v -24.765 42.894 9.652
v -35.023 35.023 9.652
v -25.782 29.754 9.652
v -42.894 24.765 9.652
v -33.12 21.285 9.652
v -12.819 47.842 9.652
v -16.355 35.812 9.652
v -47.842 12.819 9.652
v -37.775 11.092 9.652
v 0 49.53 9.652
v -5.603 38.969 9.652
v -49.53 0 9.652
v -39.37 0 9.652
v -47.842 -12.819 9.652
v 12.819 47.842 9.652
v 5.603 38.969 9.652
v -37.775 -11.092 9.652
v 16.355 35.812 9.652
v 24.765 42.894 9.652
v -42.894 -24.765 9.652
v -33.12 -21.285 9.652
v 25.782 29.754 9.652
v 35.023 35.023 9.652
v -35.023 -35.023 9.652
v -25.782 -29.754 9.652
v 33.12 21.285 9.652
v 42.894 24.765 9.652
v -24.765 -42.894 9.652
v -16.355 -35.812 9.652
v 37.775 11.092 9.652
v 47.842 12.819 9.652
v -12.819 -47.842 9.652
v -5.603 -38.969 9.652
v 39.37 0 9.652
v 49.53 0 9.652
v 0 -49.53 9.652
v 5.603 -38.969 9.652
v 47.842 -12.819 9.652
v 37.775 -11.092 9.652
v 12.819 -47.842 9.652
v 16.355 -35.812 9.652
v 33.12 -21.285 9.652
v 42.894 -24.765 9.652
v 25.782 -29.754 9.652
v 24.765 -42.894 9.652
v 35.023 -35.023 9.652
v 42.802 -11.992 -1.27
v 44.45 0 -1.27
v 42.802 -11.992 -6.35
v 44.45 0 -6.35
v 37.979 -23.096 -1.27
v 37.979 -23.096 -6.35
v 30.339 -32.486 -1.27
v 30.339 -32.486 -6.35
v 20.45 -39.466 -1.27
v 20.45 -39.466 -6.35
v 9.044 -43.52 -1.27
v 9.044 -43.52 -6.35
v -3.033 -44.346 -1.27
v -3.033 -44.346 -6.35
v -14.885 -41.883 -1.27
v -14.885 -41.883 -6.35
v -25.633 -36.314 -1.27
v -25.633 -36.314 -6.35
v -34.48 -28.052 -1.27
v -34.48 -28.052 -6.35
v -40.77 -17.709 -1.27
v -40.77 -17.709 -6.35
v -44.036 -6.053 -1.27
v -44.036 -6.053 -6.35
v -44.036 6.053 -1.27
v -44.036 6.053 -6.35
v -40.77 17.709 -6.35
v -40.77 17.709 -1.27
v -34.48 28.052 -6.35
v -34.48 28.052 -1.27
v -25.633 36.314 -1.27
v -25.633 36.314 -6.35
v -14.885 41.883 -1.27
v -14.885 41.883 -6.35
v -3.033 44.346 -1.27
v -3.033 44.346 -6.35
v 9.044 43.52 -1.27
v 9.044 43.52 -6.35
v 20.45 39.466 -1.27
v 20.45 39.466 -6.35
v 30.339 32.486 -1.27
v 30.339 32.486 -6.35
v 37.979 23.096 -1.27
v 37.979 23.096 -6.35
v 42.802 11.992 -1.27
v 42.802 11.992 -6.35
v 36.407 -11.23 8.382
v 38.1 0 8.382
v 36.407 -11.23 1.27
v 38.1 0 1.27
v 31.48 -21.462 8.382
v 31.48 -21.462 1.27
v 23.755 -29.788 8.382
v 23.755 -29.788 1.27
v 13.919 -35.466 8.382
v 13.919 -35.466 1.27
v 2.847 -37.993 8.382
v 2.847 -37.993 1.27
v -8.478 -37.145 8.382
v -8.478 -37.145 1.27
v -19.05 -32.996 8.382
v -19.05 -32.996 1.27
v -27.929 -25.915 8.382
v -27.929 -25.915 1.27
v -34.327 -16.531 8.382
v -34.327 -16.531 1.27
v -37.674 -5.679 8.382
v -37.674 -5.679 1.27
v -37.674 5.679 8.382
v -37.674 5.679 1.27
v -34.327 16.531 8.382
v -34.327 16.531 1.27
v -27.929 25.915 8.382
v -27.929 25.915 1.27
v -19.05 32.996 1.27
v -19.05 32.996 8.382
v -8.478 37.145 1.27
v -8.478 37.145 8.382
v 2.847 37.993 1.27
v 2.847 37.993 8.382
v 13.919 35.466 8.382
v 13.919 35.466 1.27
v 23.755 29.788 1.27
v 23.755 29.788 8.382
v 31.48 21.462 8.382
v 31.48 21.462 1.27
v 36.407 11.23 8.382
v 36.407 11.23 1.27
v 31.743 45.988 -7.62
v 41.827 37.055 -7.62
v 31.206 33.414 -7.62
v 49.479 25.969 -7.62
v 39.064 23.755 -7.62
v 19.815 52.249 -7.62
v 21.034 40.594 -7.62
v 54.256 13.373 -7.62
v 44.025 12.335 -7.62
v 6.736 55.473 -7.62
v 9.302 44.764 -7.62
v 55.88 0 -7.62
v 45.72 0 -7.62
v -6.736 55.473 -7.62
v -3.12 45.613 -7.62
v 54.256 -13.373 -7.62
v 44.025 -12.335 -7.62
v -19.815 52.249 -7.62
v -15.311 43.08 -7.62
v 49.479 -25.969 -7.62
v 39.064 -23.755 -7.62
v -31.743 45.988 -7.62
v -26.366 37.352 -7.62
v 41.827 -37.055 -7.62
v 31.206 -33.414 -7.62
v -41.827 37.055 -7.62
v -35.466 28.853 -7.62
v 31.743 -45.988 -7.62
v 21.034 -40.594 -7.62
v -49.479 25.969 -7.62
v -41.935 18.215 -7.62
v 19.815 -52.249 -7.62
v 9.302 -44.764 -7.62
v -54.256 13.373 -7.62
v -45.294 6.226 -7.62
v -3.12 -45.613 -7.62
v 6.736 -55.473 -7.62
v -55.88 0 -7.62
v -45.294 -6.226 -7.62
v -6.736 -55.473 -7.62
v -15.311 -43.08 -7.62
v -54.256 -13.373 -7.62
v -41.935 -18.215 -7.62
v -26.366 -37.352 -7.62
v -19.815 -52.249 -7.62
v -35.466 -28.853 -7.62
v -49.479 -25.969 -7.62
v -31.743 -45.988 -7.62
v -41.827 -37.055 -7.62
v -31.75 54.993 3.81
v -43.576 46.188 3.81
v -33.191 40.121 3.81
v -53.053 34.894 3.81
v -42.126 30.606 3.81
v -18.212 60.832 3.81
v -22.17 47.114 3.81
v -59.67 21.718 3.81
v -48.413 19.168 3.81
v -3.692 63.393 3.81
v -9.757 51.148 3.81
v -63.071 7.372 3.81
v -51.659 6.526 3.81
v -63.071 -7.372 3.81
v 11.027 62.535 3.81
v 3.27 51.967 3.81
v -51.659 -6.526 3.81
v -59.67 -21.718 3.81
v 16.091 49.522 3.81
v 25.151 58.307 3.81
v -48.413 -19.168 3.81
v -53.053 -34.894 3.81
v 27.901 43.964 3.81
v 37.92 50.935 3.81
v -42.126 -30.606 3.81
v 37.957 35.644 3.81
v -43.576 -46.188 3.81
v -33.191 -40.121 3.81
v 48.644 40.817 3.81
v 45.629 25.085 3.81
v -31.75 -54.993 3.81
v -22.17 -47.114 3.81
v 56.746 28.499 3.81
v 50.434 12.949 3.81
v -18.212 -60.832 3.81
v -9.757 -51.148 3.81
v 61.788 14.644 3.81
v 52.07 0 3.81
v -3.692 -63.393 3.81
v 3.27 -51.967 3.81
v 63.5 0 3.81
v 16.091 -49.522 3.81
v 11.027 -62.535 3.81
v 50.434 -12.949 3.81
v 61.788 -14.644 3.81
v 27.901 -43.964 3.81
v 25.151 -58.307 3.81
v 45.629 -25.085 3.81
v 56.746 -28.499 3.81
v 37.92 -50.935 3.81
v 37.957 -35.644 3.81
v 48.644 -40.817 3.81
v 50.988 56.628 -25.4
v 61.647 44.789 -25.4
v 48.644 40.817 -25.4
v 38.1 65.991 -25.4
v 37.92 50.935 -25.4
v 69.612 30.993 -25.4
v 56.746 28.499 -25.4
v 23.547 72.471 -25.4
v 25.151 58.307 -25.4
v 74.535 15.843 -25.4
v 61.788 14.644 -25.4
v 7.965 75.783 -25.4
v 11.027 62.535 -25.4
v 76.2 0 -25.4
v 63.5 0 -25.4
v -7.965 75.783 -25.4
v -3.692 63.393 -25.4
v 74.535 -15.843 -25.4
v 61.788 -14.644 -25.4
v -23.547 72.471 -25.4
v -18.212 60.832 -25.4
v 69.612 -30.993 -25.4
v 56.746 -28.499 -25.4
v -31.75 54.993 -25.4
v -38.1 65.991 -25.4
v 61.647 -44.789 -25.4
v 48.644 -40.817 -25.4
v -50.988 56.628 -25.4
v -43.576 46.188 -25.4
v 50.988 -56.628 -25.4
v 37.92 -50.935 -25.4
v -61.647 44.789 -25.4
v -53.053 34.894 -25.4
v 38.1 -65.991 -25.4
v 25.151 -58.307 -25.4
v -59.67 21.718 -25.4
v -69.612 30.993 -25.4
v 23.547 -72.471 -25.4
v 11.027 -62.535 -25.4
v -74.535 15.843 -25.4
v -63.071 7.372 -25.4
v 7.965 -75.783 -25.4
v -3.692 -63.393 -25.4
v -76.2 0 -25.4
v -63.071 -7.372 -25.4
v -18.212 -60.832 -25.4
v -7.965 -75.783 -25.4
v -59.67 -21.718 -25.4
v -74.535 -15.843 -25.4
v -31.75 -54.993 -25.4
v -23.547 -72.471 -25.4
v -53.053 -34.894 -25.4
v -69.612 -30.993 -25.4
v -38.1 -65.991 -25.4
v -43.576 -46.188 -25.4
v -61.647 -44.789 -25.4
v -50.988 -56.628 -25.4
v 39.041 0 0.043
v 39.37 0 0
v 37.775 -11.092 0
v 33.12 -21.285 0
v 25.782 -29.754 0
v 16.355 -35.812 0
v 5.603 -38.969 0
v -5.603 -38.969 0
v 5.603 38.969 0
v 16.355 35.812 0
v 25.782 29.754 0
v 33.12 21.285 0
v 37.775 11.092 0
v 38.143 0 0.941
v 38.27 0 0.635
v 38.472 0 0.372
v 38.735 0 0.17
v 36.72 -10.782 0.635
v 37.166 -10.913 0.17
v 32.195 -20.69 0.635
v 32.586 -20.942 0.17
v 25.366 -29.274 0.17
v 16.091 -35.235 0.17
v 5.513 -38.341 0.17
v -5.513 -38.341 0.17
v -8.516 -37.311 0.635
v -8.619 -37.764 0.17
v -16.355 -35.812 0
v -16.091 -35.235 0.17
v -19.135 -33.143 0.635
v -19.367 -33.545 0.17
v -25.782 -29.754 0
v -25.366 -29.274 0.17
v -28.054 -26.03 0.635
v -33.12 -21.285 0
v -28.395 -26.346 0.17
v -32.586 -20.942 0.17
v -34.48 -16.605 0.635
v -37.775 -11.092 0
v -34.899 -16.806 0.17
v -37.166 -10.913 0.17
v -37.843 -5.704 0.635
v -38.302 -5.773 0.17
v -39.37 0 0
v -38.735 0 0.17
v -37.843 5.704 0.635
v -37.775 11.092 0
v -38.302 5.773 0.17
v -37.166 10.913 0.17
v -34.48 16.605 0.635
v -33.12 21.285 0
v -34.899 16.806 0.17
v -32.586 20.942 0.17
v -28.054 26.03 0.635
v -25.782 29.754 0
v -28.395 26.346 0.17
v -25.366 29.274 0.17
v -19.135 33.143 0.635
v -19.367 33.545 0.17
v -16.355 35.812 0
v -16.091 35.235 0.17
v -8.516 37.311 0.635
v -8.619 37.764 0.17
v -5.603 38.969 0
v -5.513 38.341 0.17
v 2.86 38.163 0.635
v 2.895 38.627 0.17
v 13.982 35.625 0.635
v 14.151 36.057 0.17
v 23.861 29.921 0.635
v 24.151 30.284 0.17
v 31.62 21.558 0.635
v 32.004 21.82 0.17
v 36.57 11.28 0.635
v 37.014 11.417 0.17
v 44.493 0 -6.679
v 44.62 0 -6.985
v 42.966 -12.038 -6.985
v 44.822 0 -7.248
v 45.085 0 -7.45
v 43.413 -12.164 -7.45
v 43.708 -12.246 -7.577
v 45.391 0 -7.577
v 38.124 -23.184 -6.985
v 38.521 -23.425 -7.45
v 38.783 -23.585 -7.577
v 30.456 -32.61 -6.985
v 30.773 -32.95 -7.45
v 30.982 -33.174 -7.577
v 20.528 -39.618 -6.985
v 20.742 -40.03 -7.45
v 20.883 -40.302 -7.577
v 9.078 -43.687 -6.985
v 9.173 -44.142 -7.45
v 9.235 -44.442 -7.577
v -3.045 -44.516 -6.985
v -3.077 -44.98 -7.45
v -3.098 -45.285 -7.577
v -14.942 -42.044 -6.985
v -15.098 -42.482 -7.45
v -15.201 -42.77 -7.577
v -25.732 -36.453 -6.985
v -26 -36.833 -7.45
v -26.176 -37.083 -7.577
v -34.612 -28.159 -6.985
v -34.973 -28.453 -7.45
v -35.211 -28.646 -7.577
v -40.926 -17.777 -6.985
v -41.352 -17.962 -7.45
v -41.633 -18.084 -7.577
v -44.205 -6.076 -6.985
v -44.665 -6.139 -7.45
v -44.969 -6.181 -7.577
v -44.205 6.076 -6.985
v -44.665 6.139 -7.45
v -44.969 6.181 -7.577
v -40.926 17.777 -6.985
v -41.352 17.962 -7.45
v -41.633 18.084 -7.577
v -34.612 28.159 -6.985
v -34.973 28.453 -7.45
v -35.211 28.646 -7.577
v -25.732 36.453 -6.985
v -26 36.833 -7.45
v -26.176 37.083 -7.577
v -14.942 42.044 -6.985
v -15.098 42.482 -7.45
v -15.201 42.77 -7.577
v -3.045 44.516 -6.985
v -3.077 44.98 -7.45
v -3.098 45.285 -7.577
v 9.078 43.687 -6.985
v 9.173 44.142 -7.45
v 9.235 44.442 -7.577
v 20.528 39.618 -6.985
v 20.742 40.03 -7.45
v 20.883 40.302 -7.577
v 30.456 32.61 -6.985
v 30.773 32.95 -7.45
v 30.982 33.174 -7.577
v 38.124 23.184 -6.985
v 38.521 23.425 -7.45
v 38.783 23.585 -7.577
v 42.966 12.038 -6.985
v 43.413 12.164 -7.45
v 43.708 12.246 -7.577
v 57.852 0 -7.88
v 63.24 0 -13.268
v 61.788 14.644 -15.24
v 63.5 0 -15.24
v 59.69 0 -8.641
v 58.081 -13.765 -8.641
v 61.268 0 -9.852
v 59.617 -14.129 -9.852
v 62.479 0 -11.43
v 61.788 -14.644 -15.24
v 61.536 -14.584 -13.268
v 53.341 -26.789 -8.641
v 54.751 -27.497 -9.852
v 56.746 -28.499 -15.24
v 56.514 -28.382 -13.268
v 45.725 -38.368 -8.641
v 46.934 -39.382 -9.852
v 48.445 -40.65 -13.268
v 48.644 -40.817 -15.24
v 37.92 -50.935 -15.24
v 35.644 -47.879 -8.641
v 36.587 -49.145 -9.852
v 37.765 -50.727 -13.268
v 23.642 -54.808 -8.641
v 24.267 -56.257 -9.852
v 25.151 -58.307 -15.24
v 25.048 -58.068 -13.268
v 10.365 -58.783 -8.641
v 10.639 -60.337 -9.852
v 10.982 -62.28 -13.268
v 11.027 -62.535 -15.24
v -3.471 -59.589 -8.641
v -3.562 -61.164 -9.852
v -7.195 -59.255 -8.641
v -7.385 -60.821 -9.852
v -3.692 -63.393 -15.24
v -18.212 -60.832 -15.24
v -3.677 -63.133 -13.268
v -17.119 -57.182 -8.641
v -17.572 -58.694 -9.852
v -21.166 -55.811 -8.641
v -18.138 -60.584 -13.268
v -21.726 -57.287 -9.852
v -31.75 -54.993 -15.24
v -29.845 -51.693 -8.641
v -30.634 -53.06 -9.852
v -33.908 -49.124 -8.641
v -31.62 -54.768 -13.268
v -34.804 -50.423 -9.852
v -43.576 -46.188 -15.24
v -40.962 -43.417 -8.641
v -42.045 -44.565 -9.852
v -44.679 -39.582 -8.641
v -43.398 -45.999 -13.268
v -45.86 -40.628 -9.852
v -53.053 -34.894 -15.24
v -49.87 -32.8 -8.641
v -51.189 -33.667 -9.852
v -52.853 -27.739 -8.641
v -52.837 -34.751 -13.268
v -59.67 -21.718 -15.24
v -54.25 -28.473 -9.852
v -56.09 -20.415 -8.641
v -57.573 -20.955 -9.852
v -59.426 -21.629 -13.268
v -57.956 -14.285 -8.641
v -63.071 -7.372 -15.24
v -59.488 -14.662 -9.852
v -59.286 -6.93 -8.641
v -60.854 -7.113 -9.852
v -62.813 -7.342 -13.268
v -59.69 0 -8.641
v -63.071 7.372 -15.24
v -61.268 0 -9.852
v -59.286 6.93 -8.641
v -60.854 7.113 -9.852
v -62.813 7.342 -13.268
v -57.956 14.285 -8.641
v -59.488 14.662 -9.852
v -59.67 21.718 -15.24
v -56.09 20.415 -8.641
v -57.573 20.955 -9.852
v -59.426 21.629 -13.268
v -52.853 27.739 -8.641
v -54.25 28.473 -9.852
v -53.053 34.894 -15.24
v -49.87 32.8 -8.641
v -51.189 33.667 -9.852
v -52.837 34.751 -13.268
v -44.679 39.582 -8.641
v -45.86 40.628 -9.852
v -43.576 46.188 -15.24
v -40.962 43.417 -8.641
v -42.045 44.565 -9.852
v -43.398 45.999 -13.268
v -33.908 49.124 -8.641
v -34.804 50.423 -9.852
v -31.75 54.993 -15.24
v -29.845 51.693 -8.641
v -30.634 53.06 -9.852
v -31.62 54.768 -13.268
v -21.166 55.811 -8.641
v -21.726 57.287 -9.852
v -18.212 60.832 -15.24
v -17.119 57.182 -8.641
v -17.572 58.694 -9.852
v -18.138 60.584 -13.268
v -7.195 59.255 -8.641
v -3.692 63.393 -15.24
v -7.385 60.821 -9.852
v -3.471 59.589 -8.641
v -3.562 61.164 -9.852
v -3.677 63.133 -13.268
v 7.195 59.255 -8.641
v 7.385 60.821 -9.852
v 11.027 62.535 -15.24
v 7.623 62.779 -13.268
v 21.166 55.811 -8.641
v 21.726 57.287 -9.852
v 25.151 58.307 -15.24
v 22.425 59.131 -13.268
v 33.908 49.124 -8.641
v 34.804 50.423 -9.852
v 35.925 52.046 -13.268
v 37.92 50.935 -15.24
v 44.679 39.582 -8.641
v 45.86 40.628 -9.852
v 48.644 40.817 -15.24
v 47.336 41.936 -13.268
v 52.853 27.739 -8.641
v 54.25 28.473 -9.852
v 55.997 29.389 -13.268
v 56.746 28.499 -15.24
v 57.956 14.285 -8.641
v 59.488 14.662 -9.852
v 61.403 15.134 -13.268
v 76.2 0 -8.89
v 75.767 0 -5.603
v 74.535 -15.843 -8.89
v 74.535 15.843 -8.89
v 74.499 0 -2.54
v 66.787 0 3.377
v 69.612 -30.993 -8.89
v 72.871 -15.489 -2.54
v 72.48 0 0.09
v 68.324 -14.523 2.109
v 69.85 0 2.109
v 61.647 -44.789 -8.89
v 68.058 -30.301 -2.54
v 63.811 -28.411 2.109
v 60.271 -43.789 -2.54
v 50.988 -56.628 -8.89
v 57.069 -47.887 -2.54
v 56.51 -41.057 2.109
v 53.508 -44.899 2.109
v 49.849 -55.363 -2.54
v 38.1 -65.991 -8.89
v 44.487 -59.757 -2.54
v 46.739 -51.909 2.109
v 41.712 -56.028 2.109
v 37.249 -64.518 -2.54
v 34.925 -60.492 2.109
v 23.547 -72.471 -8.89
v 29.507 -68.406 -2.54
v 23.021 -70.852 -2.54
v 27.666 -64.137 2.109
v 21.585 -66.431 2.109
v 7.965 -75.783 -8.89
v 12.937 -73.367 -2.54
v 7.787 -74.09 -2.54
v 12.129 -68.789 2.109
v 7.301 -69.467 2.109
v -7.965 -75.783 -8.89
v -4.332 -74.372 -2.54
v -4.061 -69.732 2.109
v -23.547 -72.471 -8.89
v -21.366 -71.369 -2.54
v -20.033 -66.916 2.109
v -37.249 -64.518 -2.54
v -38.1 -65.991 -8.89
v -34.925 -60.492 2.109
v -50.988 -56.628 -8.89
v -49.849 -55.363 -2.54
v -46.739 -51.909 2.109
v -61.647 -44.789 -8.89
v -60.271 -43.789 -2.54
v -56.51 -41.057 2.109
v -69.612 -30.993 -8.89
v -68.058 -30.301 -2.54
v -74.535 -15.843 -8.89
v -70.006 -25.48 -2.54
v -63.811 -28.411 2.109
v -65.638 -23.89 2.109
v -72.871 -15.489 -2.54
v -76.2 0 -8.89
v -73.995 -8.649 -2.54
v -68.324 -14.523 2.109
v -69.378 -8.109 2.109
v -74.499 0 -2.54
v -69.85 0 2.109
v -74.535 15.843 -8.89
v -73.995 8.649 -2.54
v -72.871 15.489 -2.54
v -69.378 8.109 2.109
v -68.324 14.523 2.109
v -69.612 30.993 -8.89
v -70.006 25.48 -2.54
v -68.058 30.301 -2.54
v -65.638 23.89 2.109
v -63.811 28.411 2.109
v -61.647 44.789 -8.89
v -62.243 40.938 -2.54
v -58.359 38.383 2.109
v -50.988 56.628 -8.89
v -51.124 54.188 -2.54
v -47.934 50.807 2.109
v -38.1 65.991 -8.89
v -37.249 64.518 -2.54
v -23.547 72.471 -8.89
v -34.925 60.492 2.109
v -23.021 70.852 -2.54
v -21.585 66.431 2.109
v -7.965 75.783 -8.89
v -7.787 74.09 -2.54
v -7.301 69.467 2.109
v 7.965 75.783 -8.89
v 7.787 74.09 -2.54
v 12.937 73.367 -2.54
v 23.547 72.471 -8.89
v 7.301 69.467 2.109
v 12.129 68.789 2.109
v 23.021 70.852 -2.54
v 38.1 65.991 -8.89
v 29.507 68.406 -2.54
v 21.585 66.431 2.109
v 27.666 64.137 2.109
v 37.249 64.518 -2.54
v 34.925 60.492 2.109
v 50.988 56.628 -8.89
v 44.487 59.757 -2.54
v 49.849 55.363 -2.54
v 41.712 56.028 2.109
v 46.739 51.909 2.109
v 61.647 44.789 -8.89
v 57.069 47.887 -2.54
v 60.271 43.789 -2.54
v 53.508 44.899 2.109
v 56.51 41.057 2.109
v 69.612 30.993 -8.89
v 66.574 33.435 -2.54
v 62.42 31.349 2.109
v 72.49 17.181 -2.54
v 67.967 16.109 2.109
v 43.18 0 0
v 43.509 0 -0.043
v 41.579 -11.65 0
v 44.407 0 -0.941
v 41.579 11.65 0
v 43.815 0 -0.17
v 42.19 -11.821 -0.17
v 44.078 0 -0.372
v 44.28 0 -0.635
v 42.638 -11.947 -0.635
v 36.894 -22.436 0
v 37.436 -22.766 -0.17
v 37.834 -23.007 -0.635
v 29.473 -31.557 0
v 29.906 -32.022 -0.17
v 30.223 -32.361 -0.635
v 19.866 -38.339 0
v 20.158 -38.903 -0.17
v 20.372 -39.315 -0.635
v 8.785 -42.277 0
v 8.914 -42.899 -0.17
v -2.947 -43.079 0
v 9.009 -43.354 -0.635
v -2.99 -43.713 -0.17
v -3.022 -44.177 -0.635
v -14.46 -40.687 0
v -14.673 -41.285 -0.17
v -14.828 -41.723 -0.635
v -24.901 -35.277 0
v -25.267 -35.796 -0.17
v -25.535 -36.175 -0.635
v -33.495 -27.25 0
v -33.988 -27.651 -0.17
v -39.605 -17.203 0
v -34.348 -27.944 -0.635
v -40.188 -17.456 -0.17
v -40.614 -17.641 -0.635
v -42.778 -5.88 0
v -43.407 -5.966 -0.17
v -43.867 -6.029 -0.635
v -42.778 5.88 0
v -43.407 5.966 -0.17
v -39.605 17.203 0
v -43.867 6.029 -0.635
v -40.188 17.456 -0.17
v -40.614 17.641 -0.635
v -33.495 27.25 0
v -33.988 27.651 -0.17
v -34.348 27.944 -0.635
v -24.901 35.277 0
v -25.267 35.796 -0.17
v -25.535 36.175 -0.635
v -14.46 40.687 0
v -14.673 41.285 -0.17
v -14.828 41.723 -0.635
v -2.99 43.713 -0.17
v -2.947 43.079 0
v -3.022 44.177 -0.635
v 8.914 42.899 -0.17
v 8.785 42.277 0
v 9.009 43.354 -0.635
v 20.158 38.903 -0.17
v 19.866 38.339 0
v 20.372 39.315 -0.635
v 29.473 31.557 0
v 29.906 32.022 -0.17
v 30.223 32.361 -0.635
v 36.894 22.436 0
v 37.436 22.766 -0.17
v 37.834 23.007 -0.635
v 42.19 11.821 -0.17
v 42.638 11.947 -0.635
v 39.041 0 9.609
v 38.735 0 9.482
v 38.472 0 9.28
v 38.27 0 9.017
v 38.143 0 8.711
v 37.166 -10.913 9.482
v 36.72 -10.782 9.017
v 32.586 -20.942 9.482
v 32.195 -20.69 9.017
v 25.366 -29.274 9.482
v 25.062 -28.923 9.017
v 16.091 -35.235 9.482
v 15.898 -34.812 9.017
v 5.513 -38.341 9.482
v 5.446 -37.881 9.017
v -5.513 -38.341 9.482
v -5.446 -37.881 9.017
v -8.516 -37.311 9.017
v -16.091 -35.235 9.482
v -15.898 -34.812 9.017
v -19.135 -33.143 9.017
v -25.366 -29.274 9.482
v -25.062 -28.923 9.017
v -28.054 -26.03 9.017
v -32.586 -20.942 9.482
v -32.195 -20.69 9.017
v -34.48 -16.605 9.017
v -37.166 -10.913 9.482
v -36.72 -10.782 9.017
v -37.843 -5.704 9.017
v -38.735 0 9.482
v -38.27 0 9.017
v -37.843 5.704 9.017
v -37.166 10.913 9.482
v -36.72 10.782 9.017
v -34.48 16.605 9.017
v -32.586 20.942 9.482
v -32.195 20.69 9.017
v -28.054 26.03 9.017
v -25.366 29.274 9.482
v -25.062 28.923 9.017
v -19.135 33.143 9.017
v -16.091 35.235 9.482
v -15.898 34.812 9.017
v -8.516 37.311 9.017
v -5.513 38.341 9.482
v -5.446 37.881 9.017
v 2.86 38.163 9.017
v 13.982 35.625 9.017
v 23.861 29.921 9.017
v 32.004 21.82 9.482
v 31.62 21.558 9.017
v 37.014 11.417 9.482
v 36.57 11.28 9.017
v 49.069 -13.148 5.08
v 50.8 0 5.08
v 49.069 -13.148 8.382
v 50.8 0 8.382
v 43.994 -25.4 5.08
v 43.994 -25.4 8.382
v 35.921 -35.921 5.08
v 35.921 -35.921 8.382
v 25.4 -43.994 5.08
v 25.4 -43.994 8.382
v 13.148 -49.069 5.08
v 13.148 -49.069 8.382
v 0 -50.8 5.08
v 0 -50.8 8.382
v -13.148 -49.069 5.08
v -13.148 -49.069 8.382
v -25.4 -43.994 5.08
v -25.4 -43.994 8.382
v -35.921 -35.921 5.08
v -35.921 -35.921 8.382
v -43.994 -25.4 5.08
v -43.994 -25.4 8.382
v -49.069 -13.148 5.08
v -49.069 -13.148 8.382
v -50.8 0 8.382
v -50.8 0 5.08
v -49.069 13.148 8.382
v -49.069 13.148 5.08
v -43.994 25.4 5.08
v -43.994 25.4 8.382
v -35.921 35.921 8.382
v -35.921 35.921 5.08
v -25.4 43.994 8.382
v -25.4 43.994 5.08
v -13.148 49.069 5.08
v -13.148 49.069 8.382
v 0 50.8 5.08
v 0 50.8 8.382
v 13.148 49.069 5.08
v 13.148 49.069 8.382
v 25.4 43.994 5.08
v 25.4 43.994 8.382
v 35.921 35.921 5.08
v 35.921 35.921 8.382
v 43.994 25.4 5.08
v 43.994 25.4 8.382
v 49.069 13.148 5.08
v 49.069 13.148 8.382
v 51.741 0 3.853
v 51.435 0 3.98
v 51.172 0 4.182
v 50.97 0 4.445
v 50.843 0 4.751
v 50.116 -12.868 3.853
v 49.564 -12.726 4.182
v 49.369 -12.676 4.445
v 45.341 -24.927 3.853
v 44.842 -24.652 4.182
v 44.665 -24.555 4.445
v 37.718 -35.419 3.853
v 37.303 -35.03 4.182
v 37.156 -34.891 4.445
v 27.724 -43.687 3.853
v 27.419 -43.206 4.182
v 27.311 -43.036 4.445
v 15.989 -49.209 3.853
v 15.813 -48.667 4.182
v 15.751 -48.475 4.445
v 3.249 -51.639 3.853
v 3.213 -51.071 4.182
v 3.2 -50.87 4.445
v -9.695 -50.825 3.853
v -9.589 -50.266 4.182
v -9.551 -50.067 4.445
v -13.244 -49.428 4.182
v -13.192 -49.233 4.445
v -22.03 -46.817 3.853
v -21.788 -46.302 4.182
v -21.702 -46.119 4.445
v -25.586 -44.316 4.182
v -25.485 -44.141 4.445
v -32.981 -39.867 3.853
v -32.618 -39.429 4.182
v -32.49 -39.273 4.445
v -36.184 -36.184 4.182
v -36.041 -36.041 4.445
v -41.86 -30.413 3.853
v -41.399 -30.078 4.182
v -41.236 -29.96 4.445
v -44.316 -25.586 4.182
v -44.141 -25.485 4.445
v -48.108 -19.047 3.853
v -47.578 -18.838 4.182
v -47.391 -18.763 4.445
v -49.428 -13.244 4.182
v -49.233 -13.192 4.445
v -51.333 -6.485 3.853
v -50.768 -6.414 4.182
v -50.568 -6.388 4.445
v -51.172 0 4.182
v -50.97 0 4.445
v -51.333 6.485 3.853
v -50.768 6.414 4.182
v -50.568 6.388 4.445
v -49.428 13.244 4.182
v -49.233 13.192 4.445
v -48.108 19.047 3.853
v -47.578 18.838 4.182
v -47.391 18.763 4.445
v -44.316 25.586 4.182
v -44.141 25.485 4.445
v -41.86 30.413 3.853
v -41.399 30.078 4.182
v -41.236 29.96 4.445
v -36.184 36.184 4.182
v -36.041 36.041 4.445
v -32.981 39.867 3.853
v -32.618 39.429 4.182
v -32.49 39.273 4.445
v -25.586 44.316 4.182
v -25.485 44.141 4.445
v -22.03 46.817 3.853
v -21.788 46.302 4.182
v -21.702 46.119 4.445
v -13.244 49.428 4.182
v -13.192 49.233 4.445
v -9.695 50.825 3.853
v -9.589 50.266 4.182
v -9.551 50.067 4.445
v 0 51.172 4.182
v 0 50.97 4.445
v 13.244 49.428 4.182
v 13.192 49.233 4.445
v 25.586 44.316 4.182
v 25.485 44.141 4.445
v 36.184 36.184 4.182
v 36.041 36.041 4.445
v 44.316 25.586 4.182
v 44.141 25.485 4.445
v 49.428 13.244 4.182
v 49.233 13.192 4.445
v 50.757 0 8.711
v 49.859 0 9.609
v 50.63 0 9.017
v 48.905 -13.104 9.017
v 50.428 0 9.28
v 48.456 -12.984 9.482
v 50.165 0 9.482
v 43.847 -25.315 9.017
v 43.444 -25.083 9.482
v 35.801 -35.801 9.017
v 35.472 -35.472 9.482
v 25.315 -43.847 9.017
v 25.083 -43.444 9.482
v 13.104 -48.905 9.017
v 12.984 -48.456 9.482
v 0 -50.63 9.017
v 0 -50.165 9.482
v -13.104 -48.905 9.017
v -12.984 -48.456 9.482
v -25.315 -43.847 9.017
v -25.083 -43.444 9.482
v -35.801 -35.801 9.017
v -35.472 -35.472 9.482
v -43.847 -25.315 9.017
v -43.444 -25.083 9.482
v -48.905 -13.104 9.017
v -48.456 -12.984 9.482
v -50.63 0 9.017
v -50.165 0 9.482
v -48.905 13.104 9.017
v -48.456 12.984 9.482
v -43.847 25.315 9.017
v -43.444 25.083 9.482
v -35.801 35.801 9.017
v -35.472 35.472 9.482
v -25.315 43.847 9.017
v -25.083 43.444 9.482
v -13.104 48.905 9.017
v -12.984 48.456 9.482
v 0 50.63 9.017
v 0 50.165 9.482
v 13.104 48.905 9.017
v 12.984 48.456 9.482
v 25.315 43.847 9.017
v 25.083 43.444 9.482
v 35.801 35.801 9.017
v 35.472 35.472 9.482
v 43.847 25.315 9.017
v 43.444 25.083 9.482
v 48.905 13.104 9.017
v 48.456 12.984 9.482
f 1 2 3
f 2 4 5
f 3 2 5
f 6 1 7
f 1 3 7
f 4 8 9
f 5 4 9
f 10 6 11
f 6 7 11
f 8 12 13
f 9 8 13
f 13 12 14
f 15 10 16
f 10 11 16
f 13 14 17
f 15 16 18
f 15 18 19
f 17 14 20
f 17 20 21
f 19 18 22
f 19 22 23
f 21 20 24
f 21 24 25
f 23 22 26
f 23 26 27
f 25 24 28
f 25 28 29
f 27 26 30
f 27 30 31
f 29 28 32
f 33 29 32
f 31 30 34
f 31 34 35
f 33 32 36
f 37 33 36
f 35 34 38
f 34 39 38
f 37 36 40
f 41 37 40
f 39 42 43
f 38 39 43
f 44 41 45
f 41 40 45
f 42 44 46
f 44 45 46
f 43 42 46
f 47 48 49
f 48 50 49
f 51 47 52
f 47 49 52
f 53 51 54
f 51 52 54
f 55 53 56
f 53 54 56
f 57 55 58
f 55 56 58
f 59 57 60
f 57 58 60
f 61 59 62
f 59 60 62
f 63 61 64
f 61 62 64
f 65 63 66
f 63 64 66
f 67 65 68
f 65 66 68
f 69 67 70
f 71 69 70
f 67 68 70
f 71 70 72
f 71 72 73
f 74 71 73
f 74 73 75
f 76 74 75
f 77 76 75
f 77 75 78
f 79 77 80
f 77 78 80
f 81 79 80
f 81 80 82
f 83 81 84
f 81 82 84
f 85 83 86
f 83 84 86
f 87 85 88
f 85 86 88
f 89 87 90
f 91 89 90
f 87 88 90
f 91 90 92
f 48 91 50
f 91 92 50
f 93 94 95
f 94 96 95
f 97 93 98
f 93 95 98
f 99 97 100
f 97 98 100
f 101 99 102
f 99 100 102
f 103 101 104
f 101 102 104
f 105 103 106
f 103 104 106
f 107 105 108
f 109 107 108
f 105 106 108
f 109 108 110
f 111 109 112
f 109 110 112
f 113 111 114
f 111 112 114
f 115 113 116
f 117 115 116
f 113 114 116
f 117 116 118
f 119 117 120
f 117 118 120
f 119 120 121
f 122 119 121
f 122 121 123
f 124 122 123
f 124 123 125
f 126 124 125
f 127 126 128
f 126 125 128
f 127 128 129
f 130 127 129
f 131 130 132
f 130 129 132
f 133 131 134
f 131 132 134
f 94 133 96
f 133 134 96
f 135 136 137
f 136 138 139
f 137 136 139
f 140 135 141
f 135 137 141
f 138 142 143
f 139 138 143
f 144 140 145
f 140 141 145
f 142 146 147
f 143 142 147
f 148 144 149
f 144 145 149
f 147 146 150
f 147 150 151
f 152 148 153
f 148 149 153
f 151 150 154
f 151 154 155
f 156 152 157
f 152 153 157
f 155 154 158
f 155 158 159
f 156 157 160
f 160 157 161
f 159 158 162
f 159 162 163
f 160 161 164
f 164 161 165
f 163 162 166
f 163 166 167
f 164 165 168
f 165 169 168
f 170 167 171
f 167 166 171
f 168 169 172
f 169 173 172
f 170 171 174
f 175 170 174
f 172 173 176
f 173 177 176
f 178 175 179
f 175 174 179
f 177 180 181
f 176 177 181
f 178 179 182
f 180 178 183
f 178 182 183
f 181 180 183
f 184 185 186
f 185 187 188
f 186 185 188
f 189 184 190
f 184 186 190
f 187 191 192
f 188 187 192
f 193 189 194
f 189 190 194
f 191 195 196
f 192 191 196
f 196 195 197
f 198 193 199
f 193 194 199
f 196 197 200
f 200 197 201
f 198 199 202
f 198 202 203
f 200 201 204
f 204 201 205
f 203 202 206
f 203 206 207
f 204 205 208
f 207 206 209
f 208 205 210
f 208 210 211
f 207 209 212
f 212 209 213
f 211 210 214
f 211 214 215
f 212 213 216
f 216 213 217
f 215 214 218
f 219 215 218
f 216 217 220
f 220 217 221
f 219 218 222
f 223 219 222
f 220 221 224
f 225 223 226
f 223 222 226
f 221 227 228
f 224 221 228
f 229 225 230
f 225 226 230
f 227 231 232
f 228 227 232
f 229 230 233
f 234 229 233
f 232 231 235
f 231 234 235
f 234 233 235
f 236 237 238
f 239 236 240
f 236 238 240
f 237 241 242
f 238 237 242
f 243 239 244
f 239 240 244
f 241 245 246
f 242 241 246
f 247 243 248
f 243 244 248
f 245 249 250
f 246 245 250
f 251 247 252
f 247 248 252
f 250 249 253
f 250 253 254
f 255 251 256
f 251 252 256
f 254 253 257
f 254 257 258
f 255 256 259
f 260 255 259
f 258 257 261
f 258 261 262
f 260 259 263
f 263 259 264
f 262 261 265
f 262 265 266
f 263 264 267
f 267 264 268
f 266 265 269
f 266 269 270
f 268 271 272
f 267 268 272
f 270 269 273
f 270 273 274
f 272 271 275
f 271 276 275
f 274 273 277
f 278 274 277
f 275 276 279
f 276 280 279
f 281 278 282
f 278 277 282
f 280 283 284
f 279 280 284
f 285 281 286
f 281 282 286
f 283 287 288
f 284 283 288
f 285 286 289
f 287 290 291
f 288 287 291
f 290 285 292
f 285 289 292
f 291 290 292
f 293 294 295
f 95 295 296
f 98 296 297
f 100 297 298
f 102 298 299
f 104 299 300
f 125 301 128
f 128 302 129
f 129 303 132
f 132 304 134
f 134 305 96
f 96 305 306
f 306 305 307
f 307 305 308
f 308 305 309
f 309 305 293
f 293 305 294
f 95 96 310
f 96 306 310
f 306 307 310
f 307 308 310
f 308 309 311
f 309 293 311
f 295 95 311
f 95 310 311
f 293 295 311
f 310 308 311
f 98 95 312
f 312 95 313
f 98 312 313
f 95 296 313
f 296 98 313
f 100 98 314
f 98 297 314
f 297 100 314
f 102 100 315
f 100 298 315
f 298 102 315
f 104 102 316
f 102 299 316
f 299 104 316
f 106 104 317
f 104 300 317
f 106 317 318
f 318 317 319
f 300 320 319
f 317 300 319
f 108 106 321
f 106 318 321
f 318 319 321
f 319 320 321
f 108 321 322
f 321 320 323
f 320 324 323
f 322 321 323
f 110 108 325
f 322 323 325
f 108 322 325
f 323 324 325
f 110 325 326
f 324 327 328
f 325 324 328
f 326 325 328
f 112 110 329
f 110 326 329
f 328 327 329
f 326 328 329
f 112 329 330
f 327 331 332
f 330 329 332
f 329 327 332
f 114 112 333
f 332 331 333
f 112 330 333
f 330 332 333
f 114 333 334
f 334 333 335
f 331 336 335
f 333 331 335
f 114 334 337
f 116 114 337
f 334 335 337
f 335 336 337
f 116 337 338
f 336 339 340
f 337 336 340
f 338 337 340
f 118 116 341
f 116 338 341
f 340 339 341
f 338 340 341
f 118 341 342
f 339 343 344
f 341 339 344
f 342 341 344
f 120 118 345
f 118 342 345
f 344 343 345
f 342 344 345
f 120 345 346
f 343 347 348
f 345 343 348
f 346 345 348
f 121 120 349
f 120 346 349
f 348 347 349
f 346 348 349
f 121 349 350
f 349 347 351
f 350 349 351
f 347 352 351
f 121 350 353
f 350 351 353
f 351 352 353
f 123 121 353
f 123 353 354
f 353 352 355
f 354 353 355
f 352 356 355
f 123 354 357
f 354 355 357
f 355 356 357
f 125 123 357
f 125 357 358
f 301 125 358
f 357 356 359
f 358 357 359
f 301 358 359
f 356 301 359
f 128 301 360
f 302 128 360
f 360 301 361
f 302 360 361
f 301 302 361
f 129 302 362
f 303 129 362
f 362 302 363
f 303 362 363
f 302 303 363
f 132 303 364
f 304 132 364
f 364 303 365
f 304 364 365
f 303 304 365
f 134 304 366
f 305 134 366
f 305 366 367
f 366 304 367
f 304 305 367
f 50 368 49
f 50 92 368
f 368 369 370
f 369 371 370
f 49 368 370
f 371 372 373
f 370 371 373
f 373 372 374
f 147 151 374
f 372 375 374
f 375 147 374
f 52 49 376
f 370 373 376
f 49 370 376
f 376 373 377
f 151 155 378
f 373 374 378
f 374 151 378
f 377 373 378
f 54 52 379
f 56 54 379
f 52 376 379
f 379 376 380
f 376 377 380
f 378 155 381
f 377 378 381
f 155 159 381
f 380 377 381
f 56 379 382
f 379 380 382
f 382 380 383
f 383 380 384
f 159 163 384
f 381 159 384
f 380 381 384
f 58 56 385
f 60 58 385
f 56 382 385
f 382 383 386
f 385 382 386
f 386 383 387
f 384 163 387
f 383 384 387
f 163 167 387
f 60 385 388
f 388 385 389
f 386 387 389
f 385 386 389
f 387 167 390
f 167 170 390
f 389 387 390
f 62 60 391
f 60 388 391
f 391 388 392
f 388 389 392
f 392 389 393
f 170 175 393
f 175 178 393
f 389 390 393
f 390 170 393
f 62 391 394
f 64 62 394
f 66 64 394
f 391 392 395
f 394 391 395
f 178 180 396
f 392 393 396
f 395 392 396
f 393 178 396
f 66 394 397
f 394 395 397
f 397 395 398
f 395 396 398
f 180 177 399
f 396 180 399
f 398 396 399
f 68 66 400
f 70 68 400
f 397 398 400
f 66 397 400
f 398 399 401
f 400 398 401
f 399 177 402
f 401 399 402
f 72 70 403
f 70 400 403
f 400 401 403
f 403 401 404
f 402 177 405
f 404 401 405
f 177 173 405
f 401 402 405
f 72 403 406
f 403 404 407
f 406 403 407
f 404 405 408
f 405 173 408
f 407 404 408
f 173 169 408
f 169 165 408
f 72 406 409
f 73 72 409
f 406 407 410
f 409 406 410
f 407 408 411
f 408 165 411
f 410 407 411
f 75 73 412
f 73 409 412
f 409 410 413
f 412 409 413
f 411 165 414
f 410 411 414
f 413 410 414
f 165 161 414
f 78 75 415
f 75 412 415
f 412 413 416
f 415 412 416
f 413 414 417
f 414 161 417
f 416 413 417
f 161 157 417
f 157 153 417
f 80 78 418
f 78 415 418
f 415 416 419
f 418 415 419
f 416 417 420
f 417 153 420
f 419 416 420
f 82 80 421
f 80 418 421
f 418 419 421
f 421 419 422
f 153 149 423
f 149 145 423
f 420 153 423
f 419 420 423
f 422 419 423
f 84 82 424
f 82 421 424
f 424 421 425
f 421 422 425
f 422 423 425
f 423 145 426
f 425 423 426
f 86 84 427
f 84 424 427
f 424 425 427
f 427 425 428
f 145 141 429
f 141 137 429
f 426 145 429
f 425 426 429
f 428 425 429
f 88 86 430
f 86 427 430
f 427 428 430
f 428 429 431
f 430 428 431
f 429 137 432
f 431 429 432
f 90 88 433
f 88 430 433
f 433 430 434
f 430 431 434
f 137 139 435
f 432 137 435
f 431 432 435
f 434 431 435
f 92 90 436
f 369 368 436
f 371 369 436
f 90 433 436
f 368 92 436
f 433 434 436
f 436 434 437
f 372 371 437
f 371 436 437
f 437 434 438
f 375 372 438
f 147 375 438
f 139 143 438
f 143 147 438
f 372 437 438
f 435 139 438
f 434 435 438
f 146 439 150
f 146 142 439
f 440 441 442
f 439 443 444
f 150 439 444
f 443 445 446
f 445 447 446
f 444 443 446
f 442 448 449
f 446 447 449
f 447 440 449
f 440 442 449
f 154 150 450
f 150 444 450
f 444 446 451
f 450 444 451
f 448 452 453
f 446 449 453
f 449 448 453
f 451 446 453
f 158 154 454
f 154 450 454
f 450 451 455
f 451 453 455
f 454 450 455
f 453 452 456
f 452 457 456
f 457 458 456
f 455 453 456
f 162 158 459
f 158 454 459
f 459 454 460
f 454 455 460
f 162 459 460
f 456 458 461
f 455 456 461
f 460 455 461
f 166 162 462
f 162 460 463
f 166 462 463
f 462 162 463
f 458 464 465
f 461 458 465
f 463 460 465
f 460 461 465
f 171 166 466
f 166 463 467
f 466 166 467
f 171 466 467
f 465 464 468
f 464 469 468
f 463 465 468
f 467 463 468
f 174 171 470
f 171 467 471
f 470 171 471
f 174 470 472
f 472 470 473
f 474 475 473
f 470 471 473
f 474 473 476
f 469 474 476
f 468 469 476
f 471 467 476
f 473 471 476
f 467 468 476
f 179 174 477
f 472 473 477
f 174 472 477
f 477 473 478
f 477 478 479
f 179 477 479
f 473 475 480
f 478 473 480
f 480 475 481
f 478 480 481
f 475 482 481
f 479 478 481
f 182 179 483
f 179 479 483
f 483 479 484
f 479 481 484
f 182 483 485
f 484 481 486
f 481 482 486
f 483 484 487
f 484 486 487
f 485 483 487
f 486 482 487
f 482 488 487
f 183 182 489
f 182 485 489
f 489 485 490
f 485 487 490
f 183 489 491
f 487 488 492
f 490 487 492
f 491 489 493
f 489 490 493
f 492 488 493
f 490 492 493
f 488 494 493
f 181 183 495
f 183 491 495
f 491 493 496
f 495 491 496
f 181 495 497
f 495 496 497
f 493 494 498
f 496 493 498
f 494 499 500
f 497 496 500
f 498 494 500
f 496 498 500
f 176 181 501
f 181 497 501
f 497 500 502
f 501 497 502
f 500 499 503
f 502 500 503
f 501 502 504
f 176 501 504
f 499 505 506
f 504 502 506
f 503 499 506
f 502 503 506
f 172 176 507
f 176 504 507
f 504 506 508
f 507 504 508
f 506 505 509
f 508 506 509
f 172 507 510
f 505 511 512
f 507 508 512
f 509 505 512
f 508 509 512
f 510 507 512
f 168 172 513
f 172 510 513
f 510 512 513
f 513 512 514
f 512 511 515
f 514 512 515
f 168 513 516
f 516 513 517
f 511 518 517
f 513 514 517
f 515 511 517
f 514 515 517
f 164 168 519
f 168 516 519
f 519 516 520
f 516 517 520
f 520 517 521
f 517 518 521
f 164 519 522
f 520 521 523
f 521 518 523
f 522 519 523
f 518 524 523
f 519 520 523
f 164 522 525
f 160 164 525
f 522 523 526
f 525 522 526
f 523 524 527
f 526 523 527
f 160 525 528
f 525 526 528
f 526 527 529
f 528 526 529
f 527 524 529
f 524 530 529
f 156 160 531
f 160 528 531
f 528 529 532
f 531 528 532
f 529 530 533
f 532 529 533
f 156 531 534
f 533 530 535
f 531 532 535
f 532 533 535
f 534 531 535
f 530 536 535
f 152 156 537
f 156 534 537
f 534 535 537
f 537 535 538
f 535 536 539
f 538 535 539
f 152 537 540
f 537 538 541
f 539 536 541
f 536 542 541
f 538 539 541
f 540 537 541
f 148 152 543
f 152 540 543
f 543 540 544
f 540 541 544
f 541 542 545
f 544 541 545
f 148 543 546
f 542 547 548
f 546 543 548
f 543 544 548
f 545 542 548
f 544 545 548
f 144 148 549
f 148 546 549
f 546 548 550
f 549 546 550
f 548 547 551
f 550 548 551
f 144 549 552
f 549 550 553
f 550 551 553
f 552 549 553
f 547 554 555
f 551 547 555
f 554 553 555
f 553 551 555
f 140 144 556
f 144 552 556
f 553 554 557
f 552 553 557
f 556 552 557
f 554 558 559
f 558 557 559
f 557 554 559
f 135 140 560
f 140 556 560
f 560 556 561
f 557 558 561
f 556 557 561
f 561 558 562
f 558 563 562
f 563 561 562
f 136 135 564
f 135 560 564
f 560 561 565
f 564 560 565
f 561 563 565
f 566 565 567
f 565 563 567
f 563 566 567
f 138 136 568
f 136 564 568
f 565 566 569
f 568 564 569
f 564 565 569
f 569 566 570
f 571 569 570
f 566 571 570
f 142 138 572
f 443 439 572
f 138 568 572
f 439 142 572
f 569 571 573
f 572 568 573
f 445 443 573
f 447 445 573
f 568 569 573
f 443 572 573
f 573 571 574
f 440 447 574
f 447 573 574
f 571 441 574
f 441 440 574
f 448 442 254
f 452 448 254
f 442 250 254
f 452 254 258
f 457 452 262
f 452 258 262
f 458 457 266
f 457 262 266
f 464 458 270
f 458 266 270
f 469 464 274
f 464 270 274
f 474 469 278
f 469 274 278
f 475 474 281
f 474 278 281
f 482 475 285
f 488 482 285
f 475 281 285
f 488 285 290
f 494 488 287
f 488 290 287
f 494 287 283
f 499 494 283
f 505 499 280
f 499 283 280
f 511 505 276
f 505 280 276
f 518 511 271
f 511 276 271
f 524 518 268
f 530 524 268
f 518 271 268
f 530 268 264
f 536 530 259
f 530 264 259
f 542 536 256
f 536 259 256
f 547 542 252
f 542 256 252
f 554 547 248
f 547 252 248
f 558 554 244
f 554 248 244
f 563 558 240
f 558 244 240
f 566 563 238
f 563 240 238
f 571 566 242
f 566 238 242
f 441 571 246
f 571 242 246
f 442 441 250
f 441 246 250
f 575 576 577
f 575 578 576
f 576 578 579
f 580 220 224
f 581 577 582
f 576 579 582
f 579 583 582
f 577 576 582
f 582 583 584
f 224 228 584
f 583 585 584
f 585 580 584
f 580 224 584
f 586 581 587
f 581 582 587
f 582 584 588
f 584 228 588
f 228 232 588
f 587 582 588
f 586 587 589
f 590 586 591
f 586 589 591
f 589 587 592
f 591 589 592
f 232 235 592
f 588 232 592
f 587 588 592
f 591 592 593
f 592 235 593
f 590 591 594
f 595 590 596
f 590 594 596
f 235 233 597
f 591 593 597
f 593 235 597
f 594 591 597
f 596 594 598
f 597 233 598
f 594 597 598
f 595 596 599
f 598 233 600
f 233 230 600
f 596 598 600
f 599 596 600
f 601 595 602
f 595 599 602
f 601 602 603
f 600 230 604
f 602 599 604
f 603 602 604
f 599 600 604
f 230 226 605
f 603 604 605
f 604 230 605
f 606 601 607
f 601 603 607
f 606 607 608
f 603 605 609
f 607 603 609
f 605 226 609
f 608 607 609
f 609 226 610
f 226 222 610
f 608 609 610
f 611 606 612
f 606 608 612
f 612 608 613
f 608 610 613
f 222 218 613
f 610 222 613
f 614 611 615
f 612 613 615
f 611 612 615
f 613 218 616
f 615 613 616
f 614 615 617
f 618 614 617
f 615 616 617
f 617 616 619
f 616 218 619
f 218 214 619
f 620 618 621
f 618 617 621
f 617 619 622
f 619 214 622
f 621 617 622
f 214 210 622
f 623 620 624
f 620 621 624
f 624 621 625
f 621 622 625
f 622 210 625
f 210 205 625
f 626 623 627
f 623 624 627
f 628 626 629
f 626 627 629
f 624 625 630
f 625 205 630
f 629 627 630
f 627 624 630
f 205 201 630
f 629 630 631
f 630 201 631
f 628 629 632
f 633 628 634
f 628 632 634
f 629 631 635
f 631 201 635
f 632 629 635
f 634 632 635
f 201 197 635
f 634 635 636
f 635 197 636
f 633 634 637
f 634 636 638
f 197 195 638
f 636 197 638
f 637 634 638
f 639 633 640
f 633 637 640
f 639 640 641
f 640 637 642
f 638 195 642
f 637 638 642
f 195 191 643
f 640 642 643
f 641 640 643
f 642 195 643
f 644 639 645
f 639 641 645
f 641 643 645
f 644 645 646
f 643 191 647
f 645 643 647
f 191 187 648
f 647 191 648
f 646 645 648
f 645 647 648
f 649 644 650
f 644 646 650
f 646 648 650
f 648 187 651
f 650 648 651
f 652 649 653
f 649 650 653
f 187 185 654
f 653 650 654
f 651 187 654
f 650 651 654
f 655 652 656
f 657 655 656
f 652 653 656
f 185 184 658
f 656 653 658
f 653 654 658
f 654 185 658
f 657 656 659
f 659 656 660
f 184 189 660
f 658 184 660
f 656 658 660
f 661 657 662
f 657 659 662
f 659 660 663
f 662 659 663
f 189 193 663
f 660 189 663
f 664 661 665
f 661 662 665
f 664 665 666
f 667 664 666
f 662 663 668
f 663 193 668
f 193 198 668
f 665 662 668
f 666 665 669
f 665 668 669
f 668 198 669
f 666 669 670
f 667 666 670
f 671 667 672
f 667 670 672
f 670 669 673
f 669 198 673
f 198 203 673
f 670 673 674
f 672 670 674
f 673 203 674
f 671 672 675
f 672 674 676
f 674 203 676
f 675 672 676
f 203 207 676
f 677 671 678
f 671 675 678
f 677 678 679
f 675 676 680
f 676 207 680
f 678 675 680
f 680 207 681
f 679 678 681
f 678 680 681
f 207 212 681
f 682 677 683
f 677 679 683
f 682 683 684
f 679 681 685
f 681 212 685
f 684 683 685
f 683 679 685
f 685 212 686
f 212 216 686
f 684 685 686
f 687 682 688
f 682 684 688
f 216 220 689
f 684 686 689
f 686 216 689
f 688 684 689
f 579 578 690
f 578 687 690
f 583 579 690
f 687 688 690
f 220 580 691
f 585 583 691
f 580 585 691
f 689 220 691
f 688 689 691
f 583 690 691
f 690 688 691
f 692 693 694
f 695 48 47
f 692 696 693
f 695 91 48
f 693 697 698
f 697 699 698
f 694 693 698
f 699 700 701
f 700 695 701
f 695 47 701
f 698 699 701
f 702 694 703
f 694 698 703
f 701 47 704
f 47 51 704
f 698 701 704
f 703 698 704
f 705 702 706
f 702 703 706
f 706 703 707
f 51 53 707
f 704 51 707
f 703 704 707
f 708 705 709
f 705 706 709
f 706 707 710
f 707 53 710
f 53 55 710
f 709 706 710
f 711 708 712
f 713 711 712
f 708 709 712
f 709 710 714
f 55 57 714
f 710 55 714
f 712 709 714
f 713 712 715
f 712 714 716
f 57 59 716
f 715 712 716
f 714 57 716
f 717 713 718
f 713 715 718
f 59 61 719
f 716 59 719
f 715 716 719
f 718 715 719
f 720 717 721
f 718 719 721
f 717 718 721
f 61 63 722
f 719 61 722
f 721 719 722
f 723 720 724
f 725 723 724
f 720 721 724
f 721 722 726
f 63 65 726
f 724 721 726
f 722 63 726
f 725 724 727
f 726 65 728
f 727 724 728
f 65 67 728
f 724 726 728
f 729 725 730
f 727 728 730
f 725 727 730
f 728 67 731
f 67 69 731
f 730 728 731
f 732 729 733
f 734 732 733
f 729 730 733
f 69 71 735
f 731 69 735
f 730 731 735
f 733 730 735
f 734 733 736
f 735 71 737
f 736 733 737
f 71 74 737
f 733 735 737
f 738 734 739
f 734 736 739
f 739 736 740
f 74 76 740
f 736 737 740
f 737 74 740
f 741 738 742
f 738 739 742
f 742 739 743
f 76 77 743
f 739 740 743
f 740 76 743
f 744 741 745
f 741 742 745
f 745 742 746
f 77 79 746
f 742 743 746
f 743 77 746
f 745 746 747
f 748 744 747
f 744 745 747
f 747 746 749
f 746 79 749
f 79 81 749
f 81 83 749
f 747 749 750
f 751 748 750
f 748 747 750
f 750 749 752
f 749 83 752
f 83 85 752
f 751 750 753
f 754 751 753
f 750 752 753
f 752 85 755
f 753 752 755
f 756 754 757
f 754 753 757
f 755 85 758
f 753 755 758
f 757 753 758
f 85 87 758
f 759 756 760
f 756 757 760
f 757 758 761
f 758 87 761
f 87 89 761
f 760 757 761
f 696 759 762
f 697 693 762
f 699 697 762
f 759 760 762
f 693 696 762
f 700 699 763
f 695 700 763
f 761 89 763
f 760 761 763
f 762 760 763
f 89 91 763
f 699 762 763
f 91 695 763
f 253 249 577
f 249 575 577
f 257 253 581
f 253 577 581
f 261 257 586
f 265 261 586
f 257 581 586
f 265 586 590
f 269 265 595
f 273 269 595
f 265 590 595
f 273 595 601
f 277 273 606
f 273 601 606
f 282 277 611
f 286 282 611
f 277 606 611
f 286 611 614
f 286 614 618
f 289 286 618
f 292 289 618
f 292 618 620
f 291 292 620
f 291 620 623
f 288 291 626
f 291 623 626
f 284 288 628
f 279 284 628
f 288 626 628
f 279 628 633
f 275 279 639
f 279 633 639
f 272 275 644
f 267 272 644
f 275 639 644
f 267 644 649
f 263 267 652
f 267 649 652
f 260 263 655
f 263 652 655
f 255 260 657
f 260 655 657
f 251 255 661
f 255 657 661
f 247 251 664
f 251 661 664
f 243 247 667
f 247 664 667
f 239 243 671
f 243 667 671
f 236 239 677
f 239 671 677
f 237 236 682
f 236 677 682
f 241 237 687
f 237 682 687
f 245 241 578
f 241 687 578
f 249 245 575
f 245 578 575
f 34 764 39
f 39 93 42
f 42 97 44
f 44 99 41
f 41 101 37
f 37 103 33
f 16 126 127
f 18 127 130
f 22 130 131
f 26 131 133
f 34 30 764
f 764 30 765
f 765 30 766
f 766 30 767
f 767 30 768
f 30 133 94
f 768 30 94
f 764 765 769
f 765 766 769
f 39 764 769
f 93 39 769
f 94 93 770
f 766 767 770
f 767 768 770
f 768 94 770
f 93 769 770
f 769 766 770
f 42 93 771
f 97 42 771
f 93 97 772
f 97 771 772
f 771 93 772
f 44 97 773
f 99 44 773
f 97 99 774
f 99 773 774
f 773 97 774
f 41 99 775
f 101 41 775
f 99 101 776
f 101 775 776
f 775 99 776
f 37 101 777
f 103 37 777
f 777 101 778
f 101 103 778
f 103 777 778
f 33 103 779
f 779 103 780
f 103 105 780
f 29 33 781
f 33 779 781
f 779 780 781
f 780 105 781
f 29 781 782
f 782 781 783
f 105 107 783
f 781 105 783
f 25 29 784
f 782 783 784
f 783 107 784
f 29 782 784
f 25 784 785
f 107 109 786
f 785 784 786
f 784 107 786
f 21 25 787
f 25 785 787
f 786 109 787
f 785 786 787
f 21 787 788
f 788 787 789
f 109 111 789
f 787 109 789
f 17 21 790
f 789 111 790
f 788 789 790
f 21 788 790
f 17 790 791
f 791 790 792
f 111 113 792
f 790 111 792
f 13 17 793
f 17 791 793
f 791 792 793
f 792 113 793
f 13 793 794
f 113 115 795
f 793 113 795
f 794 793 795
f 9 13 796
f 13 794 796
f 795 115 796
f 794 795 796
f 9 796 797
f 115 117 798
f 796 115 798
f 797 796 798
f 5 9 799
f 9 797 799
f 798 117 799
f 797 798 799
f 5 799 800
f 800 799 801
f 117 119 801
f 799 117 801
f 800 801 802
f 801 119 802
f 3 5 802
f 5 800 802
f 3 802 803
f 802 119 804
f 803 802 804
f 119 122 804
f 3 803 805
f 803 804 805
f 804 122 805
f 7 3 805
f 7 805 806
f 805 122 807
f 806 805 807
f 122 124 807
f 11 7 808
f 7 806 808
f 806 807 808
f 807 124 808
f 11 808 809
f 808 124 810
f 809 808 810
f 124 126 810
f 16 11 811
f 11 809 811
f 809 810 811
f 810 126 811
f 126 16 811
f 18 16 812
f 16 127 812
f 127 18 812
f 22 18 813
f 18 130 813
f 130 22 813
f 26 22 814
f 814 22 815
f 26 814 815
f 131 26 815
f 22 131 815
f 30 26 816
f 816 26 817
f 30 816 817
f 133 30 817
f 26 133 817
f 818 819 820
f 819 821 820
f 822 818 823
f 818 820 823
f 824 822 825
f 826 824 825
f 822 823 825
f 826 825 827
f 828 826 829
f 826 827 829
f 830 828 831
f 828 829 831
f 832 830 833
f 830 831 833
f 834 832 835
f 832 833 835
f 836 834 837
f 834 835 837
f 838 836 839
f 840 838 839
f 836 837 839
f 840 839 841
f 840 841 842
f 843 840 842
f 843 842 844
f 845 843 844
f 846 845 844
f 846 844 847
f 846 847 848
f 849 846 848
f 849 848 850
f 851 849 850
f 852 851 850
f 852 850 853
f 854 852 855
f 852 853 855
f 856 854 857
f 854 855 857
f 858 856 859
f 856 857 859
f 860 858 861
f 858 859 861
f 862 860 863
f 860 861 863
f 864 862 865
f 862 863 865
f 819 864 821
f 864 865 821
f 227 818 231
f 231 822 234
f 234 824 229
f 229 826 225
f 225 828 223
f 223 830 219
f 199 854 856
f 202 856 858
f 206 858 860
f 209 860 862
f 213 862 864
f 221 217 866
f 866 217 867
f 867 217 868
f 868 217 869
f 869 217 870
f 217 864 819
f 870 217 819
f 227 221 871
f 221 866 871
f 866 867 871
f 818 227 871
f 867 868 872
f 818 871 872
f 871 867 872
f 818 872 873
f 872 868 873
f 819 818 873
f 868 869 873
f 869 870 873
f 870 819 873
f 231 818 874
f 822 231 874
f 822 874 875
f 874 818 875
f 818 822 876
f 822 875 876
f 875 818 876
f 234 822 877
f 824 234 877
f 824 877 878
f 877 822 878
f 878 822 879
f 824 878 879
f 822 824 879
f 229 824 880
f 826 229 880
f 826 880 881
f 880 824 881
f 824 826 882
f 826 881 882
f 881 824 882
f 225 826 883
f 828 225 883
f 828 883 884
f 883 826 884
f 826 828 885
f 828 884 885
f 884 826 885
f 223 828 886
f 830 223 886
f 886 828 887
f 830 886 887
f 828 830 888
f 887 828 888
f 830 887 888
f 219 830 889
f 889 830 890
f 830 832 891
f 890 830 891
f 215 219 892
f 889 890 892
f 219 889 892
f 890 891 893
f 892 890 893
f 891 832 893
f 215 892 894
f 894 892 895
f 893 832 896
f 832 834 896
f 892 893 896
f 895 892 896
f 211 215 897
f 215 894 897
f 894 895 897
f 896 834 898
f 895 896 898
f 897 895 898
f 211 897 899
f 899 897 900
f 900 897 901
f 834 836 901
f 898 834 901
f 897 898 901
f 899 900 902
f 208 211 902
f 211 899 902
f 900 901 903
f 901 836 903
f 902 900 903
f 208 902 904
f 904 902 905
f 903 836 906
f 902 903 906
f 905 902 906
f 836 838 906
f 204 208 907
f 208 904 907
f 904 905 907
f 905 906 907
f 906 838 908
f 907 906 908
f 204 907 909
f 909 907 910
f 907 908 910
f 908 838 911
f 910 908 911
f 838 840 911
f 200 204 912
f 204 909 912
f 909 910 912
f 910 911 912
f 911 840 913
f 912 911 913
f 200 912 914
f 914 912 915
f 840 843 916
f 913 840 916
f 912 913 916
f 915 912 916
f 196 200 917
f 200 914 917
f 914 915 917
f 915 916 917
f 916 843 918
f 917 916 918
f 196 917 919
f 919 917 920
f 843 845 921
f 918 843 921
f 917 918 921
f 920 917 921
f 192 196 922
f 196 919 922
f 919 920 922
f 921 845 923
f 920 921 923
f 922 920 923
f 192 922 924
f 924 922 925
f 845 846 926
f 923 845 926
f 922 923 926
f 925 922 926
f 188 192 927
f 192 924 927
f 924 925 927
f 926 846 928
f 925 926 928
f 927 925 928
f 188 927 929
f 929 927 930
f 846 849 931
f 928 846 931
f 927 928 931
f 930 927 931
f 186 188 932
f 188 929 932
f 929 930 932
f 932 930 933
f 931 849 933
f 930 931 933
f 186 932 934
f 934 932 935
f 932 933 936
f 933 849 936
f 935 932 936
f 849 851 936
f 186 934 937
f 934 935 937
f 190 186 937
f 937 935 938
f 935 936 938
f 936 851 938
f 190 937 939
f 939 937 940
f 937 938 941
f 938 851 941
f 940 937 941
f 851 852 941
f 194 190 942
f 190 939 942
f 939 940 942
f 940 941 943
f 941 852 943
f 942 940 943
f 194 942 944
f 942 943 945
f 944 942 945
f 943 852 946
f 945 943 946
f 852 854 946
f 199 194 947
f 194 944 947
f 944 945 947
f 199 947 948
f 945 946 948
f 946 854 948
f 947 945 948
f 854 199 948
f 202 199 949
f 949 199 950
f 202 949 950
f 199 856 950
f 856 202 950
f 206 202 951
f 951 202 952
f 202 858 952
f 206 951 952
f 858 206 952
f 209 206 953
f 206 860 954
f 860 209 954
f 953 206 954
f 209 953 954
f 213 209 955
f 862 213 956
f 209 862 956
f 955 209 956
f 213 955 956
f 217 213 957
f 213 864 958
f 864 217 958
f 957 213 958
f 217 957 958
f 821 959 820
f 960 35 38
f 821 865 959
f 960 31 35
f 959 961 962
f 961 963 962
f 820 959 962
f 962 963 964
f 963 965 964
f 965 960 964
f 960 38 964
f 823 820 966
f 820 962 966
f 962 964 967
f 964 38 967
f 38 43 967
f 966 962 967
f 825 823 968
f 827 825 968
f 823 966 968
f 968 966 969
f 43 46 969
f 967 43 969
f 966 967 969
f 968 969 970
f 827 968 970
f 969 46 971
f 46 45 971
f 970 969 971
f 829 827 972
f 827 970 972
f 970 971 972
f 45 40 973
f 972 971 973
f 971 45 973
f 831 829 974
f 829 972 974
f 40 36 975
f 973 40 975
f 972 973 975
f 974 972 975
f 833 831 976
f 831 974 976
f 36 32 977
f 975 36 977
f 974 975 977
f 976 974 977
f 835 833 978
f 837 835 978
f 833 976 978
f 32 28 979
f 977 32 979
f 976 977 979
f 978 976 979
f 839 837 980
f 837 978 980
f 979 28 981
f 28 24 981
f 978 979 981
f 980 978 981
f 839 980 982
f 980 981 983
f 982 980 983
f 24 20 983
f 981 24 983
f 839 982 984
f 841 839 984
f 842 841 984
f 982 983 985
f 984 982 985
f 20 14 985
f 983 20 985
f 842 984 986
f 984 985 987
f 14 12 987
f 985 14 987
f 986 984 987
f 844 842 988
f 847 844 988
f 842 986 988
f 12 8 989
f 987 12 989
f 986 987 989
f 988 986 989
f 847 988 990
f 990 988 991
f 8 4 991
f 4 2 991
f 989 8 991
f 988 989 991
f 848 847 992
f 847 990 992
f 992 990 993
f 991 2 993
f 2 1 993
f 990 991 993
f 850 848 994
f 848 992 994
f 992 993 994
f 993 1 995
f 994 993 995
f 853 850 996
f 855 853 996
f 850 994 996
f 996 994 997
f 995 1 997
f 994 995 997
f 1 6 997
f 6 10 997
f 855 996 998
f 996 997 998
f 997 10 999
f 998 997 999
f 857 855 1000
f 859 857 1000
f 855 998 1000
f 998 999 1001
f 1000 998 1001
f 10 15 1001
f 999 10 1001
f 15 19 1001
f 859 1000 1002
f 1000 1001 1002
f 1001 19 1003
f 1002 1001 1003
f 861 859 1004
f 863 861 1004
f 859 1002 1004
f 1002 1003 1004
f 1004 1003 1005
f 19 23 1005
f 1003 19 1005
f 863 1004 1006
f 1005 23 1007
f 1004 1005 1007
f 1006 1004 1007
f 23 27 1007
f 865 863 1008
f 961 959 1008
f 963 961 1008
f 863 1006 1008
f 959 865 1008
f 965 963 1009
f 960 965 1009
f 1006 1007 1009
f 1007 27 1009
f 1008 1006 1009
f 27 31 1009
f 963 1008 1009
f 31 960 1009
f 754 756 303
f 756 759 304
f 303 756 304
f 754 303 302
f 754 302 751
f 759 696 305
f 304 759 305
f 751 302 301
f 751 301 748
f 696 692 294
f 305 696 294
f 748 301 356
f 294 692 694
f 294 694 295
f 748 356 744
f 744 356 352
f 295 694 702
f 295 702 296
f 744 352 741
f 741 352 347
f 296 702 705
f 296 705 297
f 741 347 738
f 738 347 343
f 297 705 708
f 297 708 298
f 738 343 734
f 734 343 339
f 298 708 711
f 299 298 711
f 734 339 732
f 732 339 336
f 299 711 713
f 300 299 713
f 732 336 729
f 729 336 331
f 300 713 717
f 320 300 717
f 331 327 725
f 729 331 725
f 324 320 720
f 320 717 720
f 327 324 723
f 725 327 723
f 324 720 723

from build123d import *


with BuildPart() as f1:
    # F0 (on Front) → F1 (revolve)
    with BuildSketch(Plane.XZ):
        with BuildLine():
            Line((38.1, 8.382), (38.1, 1.27))
            ThreePointArc((38.1, 1.27), (38.471974, 0.371974), (39.37, 0))
            Line((39.37, 0), (43.18, 0))
            ThreePointArc((43.18, 0), (44.078026, -0.371974), (44.45, -1.27))
            Line((44.45, -1.27), (44.45, -6.35))
            ThreePointArc((44.45, -6.35), (44.821974, -7.248026), (45.72, -7.62))
            Line((45.72, -7.62), (55.88, -7.62))
            ThreePointArc((55.88, -7.62), (61.268154, -9.851846), (63.5, -15.24))
            Line((63.5, -15.24), (63.5, -25.4))
            Line((63.5, -25.4), (76.2, -25.4))
            Line((76.2, -25.4), (76.2, -8.89))
            ThreePointArc((76.2, -8.89), (72.480256, 0.090256), (63.5, 3.81))
            Line((63.5, 3.81), (52.07, 3.81))
            ThreePointArc((52.07, 3.81), (51.171974, 4.181974), (50.8, 5.08))
            Line((50.8, 5.08), (50.8, 8.382))
            ThreePointArc((50.8, 8.382), (50.428026, 9.280026), (49.53, 9.652))
            Line((49.53, 9.652), (39.37, 9.652))
            ThreePointArc((39.37, 9.652), (38.471974, 9.280026), (38.1, 8.382))
        make_face()
    revolve(axis=Axis((0, 0, -7.769779), (0, 0, -1)))


solid = f1.part
